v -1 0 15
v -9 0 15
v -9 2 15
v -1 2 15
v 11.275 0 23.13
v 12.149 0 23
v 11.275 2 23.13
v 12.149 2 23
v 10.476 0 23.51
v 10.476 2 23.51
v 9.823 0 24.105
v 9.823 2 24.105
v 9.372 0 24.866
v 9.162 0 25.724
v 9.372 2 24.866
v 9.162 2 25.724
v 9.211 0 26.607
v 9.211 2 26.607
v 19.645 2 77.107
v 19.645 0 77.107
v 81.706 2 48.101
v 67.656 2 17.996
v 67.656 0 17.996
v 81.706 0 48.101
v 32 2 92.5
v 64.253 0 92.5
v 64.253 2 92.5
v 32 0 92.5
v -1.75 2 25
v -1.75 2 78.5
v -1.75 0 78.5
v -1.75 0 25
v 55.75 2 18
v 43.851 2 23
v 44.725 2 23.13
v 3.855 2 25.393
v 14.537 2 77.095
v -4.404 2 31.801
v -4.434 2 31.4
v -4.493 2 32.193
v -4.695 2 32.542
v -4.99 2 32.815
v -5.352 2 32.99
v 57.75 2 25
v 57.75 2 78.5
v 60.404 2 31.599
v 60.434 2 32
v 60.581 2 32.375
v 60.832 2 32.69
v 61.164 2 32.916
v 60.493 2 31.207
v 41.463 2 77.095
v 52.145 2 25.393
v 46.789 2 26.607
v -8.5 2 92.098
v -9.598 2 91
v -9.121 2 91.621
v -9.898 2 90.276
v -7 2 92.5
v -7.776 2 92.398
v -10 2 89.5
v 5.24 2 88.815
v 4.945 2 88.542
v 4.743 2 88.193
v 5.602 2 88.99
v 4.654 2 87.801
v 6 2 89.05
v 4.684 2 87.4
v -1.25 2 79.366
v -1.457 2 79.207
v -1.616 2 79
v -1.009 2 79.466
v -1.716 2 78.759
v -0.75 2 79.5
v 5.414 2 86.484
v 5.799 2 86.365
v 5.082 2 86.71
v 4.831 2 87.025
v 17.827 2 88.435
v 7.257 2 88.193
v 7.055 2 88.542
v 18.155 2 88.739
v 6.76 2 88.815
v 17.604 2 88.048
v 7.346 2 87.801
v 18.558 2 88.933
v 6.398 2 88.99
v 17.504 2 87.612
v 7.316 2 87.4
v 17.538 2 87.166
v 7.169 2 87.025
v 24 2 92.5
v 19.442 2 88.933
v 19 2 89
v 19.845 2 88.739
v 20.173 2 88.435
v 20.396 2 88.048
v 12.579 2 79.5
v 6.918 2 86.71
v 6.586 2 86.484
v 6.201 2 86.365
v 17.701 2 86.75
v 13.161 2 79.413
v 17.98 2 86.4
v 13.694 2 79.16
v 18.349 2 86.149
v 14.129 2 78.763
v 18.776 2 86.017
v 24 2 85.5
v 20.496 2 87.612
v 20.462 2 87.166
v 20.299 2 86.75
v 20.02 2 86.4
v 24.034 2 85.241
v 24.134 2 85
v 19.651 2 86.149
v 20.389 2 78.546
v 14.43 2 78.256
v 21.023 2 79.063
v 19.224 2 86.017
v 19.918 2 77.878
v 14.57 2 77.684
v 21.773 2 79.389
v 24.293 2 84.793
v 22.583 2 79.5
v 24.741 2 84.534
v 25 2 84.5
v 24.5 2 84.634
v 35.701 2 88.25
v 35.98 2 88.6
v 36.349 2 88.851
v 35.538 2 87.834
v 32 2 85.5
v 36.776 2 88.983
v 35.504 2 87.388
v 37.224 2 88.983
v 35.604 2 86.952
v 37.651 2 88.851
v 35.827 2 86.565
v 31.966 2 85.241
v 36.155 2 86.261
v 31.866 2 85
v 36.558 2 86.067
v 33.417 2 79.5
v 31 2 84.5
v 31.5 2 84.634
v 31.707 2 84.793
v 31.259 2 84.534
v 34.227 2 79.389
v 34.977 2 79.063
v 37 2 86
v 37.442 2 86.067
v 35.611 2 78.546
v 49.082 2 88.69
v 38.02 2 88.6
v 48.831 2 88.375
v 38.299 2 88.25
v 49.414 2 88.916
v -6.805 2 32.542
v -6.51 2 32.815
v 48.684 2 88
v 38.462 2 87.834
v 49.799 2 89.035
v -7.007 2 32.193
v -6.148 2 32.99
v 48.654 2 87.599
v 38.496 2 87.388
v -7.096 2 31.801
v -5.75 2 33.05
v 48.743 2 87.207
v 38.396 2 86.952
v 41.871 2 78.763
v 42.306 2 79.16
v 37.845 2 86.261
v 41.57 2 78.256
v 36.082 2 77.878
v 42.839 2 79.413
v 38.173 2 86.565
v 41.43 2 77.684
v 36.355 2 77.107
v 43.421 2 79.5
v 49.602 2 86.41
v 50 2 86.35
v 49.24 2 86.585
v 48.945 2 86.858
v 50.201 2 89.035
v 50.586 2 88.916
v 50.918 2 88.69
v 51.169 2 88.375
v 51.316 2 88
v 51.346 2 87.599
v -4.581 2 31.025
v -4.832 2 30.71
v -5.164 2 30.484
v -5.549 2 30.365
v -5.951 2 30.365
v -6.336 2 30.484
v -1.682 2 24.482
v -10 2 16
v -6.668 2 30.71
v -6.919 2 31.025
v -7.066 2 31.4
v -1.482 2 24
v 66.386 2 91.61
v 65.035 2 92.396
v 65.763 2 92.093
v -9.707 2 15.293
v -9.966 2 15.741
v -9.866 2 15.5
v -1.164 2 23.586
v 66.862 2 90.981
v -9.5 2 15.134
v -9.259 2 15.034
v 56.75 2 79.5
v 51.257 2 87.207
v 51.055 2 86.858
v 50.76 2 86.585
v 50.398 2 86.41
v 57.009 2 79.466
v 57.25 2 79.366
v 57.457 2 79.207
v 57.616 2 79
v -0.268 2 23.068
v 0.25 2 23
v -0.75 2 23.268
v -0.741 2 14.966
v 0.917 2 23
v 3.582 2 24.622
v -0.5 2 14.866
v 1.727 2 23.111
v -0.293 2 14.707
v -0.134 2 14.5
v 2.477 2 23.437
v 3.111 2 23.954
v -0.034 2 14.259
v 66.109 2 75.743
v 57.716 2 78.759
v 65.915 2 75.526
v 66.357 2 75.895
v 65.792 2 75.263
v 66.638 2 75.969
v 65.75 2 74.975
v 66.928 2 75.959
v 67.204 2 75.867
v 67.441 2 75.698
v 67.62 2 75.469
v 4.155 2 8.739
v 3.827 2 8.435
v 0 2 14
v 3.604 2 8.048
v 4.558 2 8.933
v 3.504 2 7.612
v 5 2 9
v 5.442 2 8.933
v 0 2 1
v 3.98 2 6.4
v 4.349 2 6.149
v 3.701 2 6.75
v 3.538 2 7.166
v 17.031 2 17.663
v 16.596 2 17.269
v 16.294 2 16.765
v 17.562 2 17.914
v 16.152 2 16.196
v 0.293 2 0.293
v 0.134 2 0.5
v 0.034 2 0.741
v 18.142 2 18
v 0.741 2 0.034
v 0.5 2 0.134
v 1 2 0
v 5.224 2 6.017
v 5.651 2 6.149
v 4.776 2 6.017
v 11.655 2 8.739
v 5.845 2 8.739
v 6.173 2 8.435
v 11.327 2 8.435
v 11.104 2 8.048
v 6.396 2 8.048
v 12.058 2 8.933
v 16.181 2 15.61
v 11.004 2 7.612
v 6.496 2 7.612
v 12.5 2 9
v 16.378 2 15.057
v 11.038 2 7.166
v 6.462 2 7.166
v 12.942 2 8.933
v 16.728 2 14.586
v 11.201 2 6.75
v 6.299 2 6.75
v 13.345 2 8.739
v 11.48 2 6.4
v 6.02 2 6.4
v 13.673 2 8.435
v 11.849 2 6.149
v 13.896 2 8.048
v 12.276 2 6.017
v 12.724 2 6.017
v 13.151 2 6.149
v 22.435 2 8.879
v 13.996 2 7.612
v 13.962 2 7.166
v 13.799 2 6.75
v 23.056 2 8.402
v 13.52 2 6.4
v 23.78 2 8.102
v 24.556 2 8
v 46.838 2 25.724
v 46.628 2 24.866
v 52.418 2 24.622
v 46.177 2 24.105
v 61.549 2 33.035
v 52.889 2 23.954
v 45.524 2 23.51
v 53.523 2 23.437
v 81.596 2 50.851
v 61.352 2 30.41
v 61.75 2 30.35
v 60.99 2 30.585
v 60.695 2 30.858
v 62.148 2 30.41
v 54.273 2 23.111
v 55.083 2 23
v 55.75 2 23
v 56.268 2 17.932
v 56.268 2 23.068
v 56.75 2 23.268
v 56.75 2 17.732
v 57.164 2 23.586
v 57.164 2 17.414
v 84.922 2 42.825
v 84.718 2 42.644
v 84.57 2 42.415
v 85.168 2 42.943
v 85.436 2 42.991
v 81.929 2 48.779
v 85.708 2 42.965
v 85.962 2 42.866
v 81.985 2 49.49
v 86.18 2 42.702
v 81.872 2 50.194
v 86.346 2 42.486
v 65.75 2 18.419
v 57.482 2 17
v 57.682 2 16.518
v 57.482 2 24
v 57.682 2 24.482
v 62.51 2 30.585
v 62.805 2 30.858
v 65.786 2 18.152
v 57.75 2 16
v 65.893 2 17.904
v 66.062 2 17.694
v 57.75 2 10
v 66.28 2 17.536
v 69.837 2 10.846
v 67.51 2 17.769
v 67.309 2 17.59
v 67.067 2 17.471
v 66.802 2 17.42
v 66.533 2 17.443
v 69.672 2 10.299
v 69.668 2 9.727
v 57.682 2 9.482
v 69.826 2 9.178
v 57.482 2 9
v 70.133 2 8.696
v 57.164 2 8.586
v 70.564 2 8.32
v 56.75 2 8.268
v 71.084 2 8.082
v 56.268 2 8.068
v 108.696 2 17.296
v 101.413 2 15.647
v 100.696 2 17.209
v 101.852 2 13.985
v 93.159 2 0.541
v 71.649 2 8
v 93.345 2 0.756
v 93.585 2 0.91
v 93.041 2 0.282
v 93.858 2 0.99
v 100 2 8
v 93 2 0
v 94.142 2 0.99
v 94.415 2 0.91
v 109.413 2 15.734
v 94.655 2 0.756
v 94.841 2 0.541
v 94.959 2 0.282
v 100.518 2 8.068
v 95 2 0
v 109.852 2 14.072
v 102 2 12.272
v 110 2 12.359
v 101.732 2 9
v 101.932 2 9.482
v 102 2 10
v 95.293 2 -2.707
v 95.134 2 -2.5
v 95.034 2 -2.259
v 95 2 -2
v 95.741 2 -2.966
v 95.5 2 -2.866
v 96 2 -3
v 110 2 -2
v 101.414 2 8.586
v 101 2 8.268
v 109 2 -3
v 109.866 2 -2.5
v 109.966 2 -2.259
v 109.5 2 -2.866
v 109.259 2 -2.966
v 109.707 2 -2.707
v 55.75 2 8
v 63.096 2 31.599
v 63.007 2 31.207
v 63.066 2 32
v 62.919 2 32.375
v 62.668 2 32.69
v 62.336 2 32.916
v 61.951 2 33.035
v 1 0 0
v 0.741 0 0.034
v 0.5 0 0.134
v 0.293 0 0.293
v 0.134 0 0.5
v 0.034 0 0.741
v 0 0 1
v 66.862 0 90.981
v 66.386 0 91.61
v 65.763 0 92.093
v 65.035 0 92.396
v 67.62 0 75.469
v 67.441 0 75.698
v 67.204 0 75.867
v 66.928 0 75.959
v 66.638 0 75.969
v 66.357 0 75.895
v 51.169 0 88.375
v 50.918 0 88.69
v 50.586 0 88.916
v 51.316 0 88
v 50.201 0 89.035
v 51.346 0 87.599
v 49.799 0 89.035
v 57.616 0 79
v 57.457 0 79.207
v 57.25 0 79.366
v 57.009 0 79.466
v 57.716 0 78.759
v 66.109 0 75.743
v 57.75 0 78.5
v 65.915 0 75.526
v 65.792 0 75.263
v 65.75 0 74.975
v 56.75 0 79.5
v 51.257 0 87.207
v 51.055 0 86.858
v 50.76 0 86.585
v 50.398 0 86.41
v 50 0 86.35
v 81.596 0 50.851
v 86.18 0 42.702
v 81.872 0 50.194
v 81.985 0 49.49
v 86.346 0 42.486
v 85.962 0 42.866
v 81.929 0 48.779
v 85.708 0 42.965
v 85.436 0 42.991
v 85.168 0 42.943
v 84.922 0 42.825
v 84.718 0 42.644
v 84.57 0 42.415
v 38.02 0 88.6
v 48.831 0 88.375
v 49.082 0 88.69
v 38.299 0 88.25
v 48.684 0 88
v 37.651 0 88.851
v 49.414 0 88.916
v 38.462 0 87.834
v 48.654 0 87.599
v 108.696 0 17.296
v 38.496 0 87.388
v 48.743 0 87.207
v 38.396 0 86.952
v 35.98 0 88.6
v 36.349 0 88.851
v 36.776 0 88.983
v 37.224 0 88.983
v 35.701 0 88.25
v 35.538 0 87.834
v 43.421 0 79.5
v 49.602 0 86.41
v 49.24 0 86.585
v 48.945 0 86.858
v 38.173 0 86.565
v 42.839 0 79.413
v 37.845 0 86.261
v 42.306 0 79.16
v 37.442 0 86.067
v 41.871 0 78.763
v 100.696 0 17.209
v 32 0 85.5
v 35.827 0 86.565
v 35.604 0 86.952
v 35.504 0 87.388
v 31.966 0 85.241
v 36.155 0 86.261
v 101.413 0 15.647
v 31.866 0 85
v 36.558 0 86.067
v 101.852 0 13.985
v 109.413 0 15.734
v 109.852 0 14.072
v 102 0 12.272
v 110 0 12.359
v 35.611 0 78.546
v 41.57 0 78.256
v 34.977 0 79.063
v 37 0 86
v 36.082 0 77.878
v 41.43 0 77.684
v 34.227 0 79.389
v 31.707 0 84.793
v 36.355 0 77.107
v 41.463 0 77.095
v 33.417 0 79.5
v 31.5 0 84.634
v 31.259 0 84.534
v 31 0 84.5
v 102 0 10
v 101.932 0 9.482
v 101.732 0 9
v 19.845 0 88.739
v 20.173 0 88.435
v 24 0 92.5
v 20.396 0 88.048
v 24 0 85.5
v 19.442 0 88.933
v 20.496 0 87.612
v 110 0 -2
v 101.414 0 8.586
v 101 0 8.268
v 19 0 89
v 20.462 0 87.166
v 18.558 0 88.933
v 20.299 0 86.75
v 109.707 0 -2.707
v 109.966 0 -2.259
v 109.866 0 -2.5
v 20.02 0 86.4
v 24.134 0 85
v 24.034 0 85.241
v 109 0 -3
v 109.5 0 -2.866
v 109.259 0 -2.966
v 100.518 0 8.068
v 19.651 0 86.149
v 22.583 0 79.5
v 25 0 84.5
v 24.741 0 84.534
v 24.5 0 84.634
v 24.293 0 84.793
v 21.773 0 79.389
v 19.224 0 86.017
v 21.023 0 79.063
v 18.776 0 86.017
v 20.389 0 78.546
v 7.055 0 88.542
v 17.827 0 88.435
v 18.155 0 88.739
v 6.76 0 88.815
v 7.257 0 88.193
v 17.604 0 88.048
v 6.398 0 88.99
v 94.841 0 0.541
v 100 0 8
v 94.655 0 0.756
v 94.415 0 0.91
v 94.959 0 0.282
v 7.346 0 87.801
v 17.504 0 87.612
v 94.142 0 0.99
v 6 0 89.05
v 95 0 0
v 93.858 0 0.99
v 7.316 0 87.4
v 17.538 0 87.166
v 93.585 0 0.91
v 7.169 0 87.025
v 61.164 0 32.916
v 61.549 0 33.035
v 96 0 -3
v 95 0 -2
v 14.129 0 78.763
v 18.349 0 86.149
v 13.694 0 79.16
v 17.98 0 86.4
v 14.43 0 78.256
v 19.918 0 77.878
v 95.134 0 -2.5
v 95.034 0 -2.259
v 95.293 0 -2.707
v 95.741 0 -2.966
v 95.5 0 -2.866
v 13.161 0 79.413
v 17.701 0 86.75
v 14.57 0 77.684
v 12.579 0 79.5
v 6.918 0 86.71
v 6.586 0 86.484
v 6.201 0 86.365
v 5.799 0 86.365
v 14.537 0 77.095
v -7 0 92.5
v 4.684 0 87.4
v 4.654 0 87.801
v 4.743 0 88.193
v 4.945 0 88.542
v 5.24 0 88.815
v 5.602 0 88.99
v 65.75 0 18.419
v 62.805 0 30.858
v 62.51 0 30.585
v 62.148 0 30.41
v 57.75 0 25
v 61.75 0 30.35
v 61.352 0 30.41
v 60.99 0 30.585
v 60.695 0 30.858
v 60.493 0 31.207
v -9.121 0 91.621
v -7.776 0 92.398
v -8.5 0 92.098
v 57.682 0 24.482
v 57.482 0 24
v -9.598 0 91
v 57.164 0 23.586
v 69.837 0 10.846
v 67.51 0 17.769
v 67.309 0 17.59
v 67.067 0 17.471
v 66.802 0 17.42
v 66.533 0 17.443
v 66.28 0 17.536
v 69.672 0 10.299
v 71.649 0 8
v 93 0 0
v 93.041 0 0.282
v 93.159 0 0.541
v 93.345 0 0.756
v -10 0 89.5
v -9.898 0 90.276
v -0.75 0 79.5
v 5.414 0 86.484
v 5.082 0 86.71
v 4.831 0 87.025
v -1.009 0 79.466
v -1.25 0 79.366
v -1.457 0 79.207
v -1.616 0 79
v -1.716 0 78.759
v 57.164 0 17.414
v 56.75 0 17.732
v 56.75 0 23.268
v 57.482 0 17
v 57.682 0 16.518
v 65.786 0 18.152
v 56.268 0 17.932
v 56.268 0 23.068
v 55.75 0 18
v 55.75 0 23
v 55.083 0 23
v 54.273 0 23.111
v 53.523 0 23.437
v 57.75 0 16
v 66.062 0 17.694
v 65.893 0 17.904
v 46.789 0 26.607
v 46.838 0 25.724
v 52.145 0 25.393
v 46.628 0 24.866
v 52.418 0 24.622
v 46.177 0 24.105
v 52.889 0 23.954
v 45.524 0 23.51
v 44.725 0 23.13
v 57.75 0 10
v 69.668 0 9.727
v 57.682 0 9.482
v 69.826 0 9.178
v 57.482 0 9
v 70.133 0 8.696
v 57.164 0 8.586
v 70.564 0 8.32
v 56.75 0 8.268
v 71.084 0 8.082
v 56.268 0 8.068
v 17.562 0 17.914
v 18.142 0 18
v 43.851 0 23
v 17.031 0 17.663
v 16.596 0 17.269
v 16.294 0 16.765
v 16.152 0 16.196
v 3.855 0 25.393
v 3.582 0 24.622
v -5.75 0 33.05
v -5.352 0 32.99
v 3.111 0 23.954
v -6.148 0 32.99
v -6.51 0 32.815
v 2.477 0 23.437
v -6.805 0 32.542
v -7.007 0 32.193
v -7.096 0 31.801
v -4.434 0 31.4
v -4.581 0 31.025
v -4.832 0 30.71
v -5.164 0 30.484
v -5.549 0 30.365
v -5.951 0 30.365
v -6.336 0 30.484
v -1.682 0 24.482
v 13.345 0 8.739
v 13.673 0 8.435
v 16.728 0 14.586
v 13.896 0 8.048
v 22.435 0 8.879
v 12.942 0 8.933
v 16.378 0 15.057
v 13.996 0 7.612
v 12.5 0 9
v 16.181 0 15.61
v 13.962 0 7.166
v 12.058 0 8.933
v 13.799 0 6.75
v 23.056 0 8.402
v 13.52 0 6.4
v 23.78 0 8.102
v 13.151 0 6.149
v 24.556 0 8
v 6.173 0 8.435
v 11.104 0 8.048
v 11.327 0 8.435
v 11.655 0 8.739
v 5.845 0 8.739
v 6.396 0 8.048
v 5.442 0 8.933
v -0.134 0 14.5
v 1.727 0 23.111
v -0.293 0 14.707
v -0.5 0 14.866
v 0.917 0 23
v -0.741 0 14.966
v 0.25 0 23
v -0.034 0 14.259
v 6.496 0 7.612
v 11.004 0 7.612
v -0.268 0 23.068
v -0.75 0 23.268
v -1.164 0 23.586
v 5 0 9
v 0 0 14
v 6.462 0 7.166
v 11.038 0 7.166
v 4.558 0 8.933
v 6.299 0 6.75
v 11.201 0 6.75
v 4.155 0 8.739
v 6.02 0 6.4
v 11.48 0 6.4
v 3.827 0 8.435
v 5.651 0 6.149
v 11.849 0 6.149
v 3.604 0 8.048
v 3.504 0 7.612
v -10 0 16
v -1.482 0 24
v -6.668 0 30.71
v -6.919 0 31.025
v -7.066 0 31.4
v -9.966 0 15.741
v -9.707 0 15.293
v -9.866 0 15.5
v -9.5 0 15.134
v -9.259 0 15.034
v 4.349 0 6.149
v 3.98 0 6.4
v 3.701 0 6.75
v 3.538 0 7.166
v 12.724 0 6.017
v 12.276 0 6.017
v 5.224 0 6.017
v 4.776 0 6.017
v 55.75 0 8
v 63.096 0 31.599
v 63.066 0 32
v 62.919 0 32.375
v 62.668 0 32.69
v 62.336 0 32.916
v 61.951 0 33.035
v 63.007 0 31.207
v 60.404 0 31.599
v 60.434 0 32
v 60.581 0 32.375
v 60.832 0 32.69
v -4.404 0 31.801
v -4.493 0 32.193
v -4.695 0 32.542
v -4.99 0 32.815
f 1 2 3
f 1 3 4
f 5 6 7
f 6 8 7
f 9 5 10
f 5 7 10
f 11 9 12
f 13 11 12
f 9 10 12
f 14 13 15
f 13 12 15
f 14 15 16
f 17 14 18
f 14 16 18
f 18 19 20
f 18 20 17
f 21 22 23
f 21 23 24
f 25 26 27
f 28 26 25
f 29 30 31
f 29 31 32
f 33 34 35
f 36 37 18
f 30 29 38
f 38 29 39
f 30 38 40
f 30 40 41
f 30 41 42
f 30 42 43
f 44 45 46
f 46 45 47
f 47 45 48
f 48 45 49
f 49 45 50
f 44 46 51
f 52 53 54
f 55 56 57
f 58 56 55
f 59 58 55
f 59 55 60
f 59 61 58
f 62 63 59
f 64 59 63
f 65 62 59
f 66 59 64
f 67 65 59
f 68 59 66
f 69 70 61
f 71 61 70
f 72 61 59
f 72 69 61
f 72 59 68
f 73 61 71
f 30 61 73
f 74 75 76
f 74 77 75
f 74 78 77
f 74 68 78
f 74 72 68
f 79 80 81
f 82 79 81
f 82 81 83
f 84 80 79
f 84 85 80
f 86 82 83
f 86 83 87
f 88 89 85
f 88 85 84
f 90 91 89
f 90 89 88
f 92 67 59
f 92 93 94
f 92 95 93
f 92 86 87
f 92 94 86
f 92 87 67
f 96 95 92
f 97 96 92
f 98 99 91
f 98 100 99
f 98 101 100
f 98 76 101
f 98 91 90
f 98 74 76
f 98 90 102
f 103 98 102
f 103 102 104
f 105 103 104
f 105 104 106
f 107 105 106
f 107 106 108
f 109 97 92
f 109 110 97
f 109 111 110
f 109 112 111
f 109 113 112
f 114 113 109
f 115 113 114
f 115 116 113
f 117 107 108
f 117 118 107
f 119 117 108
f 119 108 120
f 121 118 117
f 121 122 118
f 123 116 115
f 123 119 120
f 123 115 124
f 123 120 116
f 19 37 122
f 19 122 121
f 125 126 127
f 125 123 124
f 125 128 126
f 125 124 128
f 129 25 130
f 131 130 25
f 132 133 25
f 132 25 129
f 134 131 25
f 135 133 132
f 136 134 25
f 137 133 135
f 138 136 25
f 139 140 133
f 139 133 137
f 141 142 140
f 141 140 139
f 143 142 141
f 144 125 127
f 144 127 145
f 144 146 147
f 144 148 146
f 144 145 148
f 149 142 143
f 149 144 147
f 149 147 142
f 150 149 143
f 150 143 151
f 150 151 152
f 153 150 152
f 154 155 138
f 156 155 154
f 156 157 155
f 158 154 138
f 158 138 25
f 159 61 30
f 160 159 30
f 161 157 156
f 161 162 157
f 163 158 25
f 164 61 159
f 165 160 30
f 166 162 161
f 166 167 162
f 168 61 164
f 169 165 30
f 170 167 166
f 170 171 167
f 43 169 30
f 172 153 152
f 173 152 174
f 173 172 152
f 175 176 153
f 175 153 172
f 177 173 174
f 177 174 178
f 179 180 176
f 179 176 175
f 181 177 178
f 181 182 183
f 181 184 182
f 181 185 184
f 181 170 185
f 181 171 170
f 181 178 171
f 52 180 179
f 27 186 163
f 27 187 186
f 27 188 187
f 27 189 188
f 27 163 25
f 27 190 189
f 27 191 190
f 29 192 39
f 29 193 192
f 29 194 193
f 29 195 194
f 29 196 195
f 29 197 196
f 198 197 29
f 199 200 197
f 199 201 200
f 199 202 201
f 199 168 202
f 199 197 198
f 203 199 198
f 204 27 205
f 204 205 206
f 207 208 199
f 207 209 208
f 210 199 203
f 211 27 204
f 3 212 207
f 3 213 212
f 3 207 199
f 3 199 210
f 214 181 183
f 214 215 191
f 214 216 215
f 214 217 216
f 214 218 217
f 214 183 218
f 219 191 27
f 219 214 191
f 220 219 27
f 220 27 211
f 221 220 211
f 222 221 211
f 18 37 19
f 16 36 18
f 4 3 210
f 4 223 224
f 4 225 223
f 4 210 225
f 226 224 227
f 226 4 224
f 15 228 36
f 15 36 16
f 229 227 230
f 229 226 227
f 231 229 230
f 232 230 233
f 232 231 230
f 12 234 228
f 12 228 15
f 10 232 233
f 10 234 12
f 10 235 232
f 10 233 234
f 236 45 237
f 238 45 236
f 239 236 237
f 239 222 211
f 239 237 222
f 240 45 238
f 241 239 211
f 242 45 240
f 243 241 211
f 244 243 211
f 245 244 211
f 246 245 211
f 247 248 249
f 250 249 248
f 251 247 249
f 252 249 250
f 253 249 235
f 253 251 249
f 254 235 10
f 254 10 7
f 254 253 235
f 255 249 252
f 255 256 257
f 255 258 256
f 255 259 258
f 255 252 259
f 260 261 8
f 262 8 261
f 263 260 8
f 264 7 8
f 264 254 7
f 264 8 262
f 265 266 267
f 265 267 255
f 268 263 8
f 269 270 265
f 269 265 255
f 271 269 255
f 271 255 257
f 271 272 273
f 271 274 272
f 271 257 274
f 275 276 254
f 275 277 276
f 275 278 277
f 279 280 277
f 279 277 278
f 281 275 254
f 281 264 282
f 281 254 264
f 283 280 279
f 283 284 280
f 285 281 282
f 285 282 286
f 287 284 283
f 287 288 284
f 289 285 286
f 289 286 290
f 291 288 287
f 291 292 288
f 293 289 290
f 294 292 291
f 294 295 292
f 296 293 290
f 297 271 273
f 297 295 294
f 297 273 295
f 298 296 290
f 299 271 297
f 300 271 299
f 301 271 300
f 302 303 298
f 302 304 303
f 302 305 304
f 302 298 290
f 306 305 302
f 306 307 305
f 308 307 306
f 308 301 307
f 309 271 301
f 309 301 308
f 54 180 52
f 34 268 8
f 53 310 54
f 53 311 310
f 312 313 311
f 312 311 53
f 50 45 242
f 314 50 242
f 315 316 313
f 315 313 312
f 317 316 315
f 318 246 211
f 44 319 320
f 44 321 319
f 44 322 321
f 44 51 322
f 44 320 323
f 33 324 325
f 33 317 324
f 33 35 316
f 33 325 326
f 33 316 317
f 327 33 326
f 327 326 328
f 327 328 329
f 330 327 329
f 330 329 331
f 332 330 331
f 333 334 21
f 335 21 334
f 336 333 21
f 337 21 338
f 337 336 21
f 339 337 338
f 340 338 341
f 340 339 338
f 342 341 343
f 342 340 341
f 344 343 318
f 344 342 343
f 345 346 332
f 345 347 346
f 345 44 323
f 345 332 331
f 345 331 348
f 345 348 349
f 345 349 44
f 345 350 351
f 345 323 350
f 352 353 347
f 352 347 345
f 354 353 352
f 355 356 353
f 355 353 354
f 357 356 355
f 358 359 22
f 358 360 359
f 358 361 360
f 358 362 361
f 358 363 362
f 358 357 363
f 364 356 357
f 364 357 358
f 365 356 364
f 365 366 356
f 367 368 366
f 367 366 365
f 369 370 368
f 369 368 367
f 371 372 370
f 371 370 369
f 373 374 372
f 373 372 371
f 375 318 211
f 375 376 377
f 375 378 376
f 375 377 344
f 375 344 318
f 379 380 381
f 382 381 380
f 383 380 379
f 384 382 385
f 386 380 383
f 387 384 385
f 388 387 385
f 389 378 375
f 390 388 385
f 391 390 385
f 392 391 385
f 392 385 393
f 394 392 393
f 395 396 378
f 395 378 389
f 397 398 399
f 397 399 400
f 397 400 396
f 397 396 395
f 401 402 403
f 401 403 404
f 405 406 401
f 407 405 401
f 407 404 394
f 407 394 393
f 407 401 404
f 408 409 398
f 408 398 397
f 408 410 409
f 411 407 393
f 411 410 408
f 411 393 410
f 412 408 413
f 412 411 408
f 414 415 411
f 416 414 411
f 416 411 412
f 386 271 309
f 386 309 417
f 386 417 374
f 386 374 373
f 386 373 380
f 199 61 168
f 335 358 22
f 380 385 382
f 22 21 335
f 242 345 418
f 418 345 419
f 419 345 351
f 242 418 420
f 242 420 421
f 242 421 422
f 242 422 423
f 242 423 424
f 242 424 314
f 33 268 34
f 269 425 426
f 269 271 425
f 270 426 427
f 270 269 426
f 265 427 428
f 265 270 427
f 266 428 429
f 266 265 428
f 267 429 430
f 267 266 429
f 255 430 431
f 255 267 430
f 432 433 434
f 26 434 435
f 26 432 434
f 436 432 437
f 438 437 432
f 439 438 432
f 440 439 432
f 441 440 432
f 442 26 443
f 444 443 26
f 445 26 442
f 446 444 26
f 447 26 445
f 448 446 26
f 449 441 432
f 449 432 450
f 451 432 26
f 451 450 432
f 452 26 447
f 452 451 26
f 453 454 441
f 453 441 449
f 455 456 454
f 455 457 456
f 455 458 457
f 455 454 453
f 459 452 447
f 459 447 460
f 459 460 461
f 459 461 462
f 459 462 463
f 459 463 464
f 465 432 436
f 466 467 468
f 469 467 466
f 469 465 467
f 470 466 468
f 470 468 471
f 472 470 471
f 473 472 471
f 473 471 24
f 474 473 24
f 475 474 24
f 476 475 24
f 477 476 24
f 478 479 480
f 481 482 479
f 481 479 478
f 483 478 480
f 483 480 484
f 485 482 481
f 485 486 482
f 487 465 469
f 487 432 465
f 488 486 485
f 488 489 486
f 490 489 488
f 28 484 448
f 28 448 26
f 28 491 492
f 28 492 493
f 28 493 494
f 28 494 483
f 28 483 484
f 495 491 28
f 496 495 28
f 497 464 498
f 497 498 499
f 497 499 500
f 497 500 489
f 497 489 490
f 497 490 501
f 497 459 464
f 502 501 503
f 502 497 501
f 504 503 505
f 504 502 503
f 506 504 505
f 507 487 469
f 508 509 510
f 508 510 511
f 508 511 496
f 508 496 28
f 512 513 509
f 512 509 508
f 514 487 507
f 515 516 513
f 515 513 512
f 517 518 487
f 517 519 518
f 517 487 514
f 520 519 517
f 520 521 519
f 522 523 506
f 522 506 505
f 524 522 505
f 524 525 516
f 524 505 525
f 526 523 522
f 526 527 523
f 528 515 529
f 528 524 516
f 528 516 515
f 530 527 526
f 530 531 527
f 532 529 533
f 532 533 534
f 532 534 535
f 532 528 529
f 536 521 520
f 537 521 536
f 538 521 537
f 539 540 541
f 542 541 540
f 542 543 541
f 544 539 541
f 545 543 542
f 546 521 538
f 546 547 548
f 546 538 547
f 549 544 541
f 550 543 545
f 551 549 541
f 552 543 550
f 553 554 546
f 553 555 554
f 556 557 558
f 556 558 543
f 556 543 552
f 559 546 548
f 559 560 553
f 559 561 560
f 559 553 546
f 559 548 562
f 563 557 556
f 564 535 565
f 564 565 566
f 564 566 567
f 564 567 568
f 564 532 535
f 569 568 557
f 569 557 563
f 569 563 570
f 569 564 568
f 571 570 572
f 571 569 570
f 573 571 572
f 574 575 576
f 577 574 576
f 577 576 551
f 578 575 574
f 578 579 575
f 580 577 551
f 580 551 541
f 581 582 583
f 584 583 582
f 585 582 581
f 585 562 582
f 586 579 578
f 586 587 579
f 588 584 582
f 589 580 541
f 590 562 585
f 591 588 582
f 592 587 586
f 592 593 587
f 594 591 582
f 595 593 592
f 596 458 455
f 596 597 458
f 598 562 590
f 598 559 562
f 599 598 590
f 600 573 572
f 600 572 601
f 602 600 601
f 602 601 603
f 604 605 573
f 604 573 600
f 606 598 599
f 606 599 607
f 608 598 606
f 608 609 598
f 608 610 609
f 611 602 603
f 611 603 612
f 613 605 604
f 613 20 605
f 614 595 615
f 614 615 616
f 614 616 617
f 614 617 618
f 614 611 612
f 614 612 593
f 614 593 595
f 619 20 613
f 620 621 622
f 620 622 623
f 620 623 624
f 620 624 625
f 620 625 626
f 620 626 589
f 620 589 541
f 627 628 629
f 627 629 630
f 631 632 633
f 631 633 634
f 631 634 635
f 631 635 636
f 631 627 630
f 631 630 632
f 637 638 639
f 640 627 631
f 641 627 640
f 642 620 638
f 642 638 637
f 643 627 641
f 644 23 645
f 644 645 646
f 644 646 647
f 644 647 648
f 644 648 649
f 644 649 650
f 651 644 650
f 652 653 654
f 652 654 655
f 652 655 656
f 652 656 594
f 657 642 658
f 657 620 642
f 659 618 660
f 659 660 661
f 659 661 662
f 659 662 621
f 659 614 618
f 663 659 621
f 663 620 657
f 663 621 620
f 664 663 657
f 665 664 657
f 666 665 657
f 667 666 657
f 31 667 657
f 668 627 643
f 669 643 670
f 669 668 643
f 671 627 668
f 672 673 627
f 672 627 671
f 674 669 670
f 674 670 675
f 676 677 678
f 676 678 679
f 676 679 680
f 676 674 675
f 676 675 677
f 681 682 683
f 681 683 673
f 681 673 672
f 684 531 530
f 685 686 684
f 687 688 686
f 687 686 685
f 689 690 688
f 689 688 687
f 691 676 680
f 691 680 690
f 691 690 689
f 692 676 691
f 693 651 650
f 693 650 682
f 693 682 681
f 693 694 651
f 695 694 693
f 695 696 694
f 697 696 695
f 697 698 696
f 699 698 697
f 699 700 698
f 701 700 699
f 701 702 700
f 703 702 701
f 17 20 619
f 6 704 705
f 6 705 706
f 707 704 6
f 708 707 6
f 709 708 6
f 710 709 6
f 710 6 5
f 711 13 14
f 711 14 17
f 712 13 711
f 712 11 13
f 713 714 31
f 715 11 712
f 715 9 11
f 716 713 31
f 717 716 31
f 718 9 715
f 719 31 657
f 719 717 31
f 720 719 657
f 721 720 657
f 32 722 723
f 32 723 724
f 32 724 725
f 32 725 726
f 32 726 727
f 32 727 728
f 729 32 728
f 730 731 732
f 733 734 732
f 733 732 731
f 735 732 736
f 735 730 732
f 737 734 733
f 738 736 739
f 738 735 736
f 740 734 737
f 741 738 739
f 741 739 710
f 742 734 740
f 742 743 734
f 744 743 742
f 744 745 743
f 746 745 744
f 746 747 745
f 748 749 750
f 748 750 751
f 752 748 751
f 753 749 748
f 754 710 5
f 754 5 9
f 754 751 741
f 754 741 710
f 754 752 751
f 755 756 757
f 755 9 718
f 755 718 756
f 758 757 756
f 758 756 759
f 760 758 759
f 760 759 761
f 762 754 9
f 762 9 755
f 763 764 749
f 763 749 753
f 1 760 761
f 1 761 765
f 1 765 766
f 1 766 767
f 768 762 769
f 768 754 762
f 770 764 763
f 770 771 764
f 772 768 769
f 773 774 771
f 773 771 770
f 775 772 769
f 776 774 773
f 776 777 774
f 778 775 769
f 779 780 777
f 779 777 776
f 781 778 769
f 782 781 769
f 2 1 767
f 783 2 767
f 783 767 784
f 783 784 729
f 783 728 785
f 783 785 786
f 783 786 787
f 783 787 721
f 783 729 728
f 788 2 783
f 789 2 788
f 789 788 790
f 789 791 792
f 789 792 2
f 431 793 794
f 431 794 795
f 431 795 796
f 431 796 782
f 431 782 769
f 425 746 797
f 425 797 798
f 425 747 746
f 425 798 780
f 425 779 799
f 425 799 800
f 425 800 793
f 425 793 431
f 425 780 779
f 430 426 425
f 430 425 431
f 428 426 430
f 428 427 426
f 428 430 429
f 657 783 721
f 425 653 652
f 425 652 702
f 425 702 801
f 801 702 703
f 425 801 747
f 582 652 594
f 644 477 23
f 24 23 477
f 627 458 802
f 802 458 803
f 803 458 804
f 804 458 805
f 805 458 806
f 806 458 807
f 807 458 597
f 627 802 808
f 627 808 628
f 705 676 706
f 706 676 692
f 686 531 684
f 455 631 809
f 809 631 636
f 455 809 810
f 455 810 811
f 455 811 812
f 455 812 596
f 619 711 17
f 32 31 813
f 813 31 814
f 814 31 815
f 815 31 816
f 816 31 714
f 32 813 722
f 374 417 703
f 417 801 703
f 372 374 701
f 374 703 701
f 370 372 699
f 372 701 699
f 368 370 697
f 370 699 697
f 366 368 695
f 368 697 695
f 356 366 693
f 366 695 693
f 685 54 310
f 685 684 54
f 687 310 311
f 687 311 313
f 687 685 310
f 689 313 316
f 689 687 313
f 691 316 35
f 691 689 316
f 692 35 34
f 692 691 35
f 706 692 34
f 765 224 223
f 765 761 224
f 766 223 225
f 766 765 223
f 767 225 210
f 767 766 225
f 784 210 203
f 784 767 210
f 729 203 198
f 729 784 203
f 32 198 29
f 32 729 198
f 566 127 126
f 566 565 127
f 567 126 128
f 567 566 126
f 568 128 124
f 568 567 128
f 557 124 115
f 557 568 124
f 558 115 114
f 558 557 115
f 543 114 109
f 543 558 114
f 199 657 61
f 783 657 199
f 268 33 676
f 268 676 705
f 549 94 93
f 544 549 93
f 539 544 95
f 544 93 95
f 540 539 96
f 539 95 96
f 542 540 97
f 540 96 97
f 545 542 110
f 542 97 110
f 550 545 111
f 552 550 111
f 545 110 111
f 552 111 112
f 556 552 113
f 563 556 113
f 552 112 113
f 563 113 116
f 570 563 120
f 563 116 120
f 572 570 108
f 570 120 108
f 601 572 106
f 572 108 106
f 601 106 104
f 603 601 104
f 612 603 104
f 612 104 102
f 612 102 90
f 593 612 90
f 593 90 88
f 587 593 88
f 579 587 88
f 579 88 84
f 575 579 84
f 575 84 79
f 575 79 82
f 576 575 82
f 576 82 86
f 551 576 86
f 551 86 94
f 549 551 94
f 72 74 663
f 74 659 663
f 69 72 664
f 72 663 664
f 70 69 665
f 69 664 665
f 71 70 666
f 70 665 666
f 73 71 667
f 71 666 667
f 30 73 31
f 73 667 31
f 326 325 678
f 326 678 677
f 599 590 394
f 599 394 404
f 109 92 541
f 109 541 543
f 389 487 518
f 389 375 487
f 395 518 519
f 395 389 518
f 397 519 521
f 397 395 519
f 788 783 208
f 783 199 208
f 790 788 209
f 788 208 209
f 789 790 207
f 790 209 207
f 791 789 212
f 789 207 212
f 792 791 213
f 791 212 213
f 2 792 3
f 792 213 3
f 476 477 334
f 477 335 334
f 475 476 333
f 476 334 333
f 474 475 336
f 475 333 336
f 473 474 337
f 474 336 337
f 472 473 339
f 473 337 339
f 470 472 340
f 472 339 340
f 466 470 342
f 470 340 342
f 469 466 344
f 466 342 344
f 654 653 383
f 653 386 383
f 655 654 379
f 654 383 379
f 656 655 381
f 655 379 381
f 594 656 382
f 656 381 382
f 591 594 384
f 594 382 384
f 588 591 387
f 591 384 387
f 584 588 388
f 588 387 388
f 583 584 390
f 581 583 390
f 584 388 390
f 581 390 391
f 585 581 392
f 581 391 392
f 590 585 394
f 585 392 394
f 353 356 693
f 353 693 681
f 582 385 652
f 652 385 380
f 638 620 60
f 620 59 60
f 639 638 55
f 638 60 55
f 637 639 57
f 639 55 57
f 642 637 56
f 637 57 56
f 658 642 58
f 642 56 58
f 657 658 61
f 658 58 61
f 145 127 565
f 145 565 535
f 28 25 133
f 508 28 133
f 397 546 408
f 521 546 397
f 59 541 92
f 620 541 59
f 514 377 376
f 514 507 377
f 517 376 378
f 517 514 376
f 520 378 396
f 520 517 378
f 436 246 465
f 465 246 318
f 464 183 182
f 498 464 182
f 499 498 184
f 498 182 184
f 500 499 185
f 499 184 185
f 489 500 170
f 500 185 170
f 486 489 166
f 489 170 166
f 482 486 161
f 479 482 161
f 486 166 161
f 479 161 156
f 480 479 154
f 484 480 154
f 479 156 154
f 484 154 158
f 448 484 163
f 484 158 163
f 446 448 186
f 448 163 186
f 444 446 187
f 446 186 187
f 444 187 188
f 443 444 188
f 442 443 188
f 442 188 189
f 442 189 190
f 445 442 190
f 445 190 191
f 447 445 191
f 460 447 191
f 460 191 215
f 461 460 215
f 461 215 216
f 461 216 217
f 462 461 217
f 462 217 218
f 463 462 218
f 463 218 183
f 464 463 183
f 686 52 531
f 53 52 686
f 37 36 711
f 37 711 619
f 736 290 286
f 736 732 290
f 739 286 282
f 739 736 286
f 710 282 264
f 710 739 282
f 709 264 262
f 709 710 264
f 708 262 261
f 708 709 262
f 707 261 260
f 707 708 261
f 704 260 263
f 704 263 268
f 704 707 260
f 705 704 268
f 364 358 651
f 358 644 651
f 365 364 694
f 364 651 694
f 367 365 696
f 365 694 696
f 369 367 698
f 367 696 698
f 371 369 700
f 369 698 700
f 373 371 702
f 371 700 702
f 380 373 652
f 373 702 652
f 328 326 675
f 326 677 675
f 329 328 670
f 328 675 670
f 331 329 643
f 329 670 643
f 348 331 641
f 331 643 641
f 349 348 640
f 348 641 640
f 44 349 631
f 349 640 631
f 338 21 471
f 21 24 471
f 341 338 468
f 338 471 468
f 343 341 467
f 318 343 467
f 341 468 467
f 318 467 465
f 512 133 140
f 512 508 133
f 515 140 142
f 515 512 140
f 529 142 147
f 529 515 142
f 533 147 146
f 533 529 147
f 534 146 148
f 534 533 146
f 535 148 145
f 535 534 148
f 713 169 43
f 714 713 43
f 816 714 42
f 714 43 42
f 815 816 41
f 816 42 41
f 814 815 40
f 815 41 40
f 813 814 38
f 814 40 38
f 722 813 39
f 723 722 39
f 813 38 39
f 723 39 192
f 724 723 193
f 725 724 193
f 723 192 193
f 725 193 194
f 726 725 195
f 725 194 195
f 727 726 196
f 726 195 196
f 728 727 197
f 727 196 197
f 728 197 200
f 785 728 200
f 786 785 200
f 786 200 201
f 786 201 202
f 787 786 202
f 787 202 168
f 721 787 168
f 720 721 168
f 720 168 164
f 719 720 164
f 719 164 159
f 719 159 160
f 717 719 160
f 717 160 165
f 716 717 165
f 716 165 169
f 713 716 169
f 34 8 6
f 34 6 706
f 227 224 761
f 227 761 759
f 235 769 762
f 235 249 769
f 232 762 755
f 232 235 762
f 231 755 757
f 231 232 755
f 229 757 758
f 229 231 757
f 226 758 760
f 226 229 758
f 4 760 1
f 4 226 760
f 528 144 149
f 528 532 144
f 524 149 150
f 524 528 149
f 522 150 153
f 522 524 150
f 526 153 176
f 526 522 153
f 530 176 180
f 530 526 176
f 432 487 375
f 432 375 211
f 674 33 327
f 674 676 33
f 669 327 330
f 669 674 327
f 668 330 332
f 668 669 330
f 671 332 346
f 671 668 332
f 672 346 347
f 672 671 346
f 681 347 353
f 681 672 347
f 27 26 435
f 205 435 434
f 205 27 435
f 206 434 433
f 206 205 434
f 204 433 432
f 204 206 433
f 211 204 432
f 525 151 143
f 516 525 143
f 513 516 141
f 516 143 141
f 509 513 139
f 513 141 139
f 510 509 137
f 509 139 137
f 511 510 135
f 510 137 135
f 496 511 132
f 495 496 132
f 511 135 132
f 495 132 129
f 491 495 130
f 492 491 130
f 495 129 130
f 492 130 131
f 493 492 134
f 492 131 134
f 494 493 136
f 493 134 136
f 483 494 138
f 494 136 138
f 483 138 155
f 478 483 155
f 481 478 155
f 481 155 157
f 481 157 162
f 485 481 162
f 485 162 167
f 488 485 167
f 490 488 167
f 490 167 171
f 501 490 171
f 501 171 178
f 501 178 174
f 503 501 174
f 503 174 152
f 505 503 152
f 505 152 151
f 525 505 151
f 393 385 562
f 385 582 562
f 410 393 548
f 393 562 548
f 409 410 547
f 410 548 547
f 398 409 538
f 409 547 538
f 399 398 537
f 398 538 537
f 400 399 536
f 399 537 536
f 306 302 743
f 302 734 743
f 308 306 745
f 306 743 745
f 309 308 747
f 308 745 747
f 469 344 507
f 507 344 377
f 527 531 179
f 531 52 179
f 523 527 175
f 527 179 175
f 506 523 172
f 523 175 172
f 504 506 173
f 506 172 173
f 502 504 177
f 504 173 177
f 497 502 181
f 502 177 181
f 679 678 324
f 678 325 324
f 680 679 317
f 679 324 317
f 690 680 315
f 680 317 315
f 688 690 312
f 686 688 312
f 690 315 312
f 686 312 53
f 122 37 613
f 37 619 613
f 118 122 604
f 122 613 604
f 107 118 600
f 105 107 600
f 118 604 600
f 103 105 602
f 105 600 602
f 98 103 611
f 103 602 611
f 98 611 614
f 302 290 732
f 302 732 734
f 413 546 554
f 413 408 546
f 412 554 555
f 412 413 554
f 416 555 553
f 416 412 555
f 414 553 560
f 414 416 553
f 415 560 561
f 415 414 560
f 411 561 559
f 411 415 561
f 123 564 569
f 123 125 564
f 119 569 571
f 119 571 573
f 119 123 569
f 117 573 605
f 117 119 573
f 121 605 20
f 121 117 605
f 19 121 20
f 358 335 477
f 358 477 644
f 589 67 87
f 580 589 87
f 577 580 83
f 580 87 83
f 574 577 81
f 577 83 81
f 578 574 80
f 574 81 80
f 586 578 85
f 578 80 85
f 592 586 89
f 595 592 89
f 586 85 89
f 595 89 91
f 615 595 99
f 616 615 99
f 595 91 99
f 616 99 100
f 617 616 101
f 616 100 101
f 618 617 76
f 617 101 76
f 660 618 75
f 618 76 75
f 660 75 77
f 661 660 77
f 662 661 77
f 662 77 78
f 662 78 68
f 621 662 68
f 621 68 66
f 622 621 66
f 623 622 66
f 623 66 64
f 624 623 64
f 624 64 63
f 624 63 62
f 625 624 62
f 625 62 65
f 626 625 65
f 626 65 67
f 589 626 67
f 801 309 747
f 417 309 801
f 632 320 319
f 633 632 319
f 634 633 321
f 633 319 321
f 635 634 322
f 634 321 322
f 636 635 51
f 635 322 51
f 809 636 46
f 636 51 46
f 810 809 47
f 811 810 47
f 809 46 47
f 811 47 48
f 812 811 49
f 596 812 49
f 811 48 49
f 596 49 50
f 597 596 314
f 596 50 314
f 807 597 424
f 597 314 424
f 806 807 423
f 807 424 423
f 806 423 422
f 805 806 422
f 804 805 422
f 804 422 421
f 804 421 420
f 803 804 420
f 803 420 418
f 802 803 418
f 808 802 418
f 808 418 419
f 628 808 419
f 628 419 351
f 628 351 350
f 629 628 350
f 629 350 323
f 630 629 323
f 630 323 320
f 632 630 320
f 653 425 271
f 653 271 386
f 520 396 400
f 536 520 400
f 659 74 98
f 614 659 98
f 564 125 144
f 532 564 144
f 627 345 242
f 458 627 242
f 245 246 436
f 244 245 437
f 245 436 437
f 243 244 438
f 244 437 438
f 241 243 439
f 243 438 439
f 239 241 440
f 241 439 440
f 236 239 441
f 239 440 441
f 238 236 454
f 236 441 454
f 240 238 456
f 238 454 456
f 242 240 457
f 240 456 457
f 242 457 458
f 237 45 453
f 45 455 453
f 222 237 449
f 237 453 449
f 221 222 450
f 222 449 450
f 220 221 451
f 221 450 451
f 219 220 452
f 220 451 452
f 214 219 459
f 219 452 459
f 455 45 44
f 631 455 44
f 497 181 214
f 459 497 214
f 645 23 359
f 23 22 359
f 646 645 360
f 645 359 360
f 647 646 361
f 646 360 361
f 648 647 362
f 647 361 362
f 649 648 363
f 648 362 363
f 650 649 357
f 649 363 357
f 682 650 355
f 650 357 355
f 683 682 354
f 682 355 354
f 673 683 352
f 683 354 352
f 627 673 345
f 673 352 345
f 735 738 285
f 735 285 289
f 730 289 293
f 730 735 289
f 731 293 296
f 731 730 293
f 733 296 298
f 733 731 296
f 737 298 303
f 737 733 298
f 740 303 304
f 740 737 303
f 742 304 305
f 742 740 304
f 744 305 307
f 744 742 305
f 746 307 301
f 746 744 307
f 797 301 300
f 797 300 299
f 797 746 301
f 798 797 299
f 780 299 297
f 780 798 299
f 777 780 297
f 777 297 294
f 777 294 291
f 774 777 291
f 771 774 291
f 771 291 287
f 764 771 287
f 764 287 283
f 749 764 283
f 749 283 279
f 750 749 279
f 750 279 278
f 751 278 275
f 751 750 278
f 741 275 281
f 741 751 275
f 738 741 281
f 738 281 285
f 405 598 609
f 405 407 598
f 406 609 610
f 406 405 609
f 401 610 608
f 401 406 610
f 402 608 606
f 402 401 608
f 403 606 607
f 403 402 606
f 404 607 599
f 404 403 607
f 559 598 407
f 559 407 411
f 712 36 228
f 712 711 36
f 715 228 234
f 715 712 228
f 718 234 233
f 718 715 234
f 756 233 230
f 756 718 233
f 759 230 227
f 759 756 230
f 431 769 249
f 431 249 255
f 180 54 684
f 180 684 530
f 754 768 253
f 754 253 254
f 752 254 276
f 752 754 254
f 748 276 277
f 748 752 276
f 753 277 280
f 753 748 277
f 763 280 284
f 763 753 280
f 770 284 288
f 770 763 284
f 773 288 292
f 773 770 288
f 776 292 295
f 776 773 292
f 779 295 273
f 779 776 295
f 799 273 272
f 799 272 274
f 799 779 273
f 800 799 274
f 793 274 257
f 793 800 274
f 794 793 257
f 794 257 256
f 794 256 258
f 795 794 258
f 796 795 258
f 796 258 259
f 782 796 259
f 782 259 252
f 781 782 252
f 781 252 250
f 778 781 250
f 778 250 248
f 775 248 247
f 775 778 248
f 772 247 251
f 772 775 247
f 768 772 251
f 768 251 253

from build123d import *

# Parameters (mm, degrees)
SKETCH_1_R          = 1.5
EXTRUDE_1_DEPTH     = 2
SKETCH_4_R          = 1.35
SKETCH_4_R_2        = 1.5
SKETCH_4_W          = 8
SKETCH_4_H          = 8
CUT_EXTRUDE_2_DEPTH = 144.736738519
SKETCH_5_R          = 1
CUT_EXTRUDE_3_DEPTH = 144.736738519
FILLET_4_R          = 1
SKETCH_2_W          = 59.5
SKETCH_2_H          = 56.5
CUT_EXTRUDE_1_DEPTH = 144.736738519
EXTRUDE_1_2_DEPTH   = 2
FILLET_1_R          = 1
FILLET_3_R          = 3
FILLET_2_R          = 2
FILLET_5_R          = 10


with BuildPart() as part:
    # 草图1 → Extrude 1 (new body)
    with BuildSketch(Plane(origin=(0, 0, 0), x_dir=(1, 0, 0), z_dir=(0, 1, 0))):
        Polygon((0, 0), (95, 0), (95, 3), (110, 3), (110, -15), (66, -92.5), (-10, -92.5), (-10, -15), (0, -15), align=None)
        with Locations(Location((5, -7.5, 0), (0, 0, 270))):
            Circle(SKETCH_1_R, mode=Mode.SUBTRACT)
        with Locations(Location((12.5, -7.5, 0), (0, 0, 270))):
            Circle(SKETCH_1_R, mode=Mode.SUBTRACT)
    extrude(amount=EXTRUDE_1_DEPTH)

    # 草图4 → 切除-拉伸2 (cut, through all)
    with BuildSketch(Plane(origin=(0, 2, 0), x_dir=(1, 0, 0), z_dir=(0, 1, 0))):
        with Locations(Location((-5.75, -31.7, 0), (0, 0, 270))):
            Circle(SKETCH_4_R)
        with Locations(Location((6, -87.7, 0), (0, 0, 270))):
            Circle(SKETCH_4_R)
        with Locations(Location((50, -87.7, 0), (0, 0, 90))):
            Circle(SKETCH_4_R)
        with Locations(Location((61.75, -31.7, 0), (0, 0, 90))):
            Circle(SKETCH_4_R)
        with Locations(Location((19, -87.5, 0), (0, 0, 270))):
            Circle(SKETCH_4_R_2)
        with Locations(Location((37, -87.5, 0), (0, 0, 90))):
            Circle(SKETCH_4_R_2)
        with Locations((28, -88.5)):
            Rectangle(SKETCH_4_W, SKETCH_4_H)
    extrude(amount=-CUT_EXTRUDE_2_DEPTH, mode=Mode.SUBTRACT)

    # 草图5 → 切除-拉伸3 (cut, through all)
    with BuildSketch(Plane(origin=(0, 2, 0), x_dir=(1, 0, 0), z_dir=(0, 1, 0))):
        with Locations((94, 0)):
            Circle(SKETCH_5_R)
    extrude(amount=-CUT_EXTRUDE_3_DEPTH, mode=Mode.SUBTRACT)

    # 圆角4
    fillet_4_edges = [part.edges().sort_by_distance(p)[0] for p in [
        (95, 1, -3),
        (110, 1, -3),
    ]]
    fillet(fillet_4_edges, radius=FILLET_4_R)

    # 草图2 → 切除-拉伸1 (cut, through all)
    with BuildSketch(Plane(origin=(0, 2, 0), x_dir=(1, 0, 0), z_dir=(0, 1, 0))):
        with Locations((28, -51.25)):
            Rectangle(SKETCH_2_W, SKETCH_2_H)
        Polygon((65.75, -78.762270127), (102, -14.912838308), (102, -8), (65.75, -8), align=None)
        Polygon((23.313708499, -8), (57.75, -8), (57.75, -18), (13.313708499, -18), align=None)
    extrude(amount=-CUT_EXTRUDE_1_DEPTH, mode=Mode.SUBTRACT)

    # 草图3 → Extrude 1 2 (add)
    with BuildSketch(Plane(origin=(0, 2, 0), x_dir=(1, 0, 0), z_dir=(0, 1, 0))):
        Polygon((87.178028776, -48.003607703), (68.015439788, -6.942747632), (63.484560212, -9.057252368), (82.647149201, -50.118112438), align=None)
        Polygon((3.051710613, -21.505844915), (15.551710613, -82.005844915), (20.448289387, -80.994155085), (7.948289387, -20.494155085), align=None)
        Polygon((48.051710613, -20.494155085), (35.551710613, -80.994155085), (40.448289387, -82.005844915), (52.948289387, -21.505844915), align=None)
    extrude(amount=-EXTRUDE_1_2_DEPTH)

    # 圆角1
    fillet_1_edges = [part.edges().sort_by_distance(p)[0] for p in [
        (65.75, 1, 78.762270127),
        (-1.75, 1, 79.5),
        (57.75, 1, 79.5),
        (0, 1, 0),
        (65.75, 1, 13.911549779),
        (-10, 1, 15),
        (0, 1, 15),
        (85.389180361, 1, 44.17053199),
        (24, 1, 84.5),
        (32, 1, 84.5),
    ]]
    fillet(fillet_1_edges, radius=FILLET_1_R)

    # 圆角3
    fillet_3_edges = [part.edges().sort_by_distance(p)[0] for p in [
        (23.313708499, 1, 8),
        (66, 1, 92.5),
        (-10, 1, 92.5),
        (82.360819639, 1, 49.504576445),
        (20.139579659, 1, 79.5),
        (3.360420341, 1, 23),
        (8.46602594, 1, 23),
        (47.53397406, 1, 23),
        (52.639579659, 1, 23),
        (35.860420341, 1, 79.5),
    ]]
    fillet(fillet_3_edges, radius=FILLET_3_R)

    # 圆角2
    fillet_2_edges = [part.edges().sort_by_distance(p)[0] for p in [
        (102, 1, 8),
        (-1.75, 1, 23),
        (57.75, 1, 23),
        (13.313708499, 1, 18),
        (57.75, 1, 8),
        (57.75, 1, 18),
        (68.508846222, 1, 8),
        (15.03397406, 1, 79.5),
        (40.96602594, 1, 79.5),
    ]]
    fillet(fillet_2_edges, radius=FILLET_2_R)

    # 圆角5
    fillet_5_edges = [part.edges().sort_by_distance(p)[0] for p in [
        (102, 1, 14.912838308),
        (110, 1, 15),
    ]]
    fillet(fillet_5_edges, radius=FILLET_5_R)


solid = part.part
